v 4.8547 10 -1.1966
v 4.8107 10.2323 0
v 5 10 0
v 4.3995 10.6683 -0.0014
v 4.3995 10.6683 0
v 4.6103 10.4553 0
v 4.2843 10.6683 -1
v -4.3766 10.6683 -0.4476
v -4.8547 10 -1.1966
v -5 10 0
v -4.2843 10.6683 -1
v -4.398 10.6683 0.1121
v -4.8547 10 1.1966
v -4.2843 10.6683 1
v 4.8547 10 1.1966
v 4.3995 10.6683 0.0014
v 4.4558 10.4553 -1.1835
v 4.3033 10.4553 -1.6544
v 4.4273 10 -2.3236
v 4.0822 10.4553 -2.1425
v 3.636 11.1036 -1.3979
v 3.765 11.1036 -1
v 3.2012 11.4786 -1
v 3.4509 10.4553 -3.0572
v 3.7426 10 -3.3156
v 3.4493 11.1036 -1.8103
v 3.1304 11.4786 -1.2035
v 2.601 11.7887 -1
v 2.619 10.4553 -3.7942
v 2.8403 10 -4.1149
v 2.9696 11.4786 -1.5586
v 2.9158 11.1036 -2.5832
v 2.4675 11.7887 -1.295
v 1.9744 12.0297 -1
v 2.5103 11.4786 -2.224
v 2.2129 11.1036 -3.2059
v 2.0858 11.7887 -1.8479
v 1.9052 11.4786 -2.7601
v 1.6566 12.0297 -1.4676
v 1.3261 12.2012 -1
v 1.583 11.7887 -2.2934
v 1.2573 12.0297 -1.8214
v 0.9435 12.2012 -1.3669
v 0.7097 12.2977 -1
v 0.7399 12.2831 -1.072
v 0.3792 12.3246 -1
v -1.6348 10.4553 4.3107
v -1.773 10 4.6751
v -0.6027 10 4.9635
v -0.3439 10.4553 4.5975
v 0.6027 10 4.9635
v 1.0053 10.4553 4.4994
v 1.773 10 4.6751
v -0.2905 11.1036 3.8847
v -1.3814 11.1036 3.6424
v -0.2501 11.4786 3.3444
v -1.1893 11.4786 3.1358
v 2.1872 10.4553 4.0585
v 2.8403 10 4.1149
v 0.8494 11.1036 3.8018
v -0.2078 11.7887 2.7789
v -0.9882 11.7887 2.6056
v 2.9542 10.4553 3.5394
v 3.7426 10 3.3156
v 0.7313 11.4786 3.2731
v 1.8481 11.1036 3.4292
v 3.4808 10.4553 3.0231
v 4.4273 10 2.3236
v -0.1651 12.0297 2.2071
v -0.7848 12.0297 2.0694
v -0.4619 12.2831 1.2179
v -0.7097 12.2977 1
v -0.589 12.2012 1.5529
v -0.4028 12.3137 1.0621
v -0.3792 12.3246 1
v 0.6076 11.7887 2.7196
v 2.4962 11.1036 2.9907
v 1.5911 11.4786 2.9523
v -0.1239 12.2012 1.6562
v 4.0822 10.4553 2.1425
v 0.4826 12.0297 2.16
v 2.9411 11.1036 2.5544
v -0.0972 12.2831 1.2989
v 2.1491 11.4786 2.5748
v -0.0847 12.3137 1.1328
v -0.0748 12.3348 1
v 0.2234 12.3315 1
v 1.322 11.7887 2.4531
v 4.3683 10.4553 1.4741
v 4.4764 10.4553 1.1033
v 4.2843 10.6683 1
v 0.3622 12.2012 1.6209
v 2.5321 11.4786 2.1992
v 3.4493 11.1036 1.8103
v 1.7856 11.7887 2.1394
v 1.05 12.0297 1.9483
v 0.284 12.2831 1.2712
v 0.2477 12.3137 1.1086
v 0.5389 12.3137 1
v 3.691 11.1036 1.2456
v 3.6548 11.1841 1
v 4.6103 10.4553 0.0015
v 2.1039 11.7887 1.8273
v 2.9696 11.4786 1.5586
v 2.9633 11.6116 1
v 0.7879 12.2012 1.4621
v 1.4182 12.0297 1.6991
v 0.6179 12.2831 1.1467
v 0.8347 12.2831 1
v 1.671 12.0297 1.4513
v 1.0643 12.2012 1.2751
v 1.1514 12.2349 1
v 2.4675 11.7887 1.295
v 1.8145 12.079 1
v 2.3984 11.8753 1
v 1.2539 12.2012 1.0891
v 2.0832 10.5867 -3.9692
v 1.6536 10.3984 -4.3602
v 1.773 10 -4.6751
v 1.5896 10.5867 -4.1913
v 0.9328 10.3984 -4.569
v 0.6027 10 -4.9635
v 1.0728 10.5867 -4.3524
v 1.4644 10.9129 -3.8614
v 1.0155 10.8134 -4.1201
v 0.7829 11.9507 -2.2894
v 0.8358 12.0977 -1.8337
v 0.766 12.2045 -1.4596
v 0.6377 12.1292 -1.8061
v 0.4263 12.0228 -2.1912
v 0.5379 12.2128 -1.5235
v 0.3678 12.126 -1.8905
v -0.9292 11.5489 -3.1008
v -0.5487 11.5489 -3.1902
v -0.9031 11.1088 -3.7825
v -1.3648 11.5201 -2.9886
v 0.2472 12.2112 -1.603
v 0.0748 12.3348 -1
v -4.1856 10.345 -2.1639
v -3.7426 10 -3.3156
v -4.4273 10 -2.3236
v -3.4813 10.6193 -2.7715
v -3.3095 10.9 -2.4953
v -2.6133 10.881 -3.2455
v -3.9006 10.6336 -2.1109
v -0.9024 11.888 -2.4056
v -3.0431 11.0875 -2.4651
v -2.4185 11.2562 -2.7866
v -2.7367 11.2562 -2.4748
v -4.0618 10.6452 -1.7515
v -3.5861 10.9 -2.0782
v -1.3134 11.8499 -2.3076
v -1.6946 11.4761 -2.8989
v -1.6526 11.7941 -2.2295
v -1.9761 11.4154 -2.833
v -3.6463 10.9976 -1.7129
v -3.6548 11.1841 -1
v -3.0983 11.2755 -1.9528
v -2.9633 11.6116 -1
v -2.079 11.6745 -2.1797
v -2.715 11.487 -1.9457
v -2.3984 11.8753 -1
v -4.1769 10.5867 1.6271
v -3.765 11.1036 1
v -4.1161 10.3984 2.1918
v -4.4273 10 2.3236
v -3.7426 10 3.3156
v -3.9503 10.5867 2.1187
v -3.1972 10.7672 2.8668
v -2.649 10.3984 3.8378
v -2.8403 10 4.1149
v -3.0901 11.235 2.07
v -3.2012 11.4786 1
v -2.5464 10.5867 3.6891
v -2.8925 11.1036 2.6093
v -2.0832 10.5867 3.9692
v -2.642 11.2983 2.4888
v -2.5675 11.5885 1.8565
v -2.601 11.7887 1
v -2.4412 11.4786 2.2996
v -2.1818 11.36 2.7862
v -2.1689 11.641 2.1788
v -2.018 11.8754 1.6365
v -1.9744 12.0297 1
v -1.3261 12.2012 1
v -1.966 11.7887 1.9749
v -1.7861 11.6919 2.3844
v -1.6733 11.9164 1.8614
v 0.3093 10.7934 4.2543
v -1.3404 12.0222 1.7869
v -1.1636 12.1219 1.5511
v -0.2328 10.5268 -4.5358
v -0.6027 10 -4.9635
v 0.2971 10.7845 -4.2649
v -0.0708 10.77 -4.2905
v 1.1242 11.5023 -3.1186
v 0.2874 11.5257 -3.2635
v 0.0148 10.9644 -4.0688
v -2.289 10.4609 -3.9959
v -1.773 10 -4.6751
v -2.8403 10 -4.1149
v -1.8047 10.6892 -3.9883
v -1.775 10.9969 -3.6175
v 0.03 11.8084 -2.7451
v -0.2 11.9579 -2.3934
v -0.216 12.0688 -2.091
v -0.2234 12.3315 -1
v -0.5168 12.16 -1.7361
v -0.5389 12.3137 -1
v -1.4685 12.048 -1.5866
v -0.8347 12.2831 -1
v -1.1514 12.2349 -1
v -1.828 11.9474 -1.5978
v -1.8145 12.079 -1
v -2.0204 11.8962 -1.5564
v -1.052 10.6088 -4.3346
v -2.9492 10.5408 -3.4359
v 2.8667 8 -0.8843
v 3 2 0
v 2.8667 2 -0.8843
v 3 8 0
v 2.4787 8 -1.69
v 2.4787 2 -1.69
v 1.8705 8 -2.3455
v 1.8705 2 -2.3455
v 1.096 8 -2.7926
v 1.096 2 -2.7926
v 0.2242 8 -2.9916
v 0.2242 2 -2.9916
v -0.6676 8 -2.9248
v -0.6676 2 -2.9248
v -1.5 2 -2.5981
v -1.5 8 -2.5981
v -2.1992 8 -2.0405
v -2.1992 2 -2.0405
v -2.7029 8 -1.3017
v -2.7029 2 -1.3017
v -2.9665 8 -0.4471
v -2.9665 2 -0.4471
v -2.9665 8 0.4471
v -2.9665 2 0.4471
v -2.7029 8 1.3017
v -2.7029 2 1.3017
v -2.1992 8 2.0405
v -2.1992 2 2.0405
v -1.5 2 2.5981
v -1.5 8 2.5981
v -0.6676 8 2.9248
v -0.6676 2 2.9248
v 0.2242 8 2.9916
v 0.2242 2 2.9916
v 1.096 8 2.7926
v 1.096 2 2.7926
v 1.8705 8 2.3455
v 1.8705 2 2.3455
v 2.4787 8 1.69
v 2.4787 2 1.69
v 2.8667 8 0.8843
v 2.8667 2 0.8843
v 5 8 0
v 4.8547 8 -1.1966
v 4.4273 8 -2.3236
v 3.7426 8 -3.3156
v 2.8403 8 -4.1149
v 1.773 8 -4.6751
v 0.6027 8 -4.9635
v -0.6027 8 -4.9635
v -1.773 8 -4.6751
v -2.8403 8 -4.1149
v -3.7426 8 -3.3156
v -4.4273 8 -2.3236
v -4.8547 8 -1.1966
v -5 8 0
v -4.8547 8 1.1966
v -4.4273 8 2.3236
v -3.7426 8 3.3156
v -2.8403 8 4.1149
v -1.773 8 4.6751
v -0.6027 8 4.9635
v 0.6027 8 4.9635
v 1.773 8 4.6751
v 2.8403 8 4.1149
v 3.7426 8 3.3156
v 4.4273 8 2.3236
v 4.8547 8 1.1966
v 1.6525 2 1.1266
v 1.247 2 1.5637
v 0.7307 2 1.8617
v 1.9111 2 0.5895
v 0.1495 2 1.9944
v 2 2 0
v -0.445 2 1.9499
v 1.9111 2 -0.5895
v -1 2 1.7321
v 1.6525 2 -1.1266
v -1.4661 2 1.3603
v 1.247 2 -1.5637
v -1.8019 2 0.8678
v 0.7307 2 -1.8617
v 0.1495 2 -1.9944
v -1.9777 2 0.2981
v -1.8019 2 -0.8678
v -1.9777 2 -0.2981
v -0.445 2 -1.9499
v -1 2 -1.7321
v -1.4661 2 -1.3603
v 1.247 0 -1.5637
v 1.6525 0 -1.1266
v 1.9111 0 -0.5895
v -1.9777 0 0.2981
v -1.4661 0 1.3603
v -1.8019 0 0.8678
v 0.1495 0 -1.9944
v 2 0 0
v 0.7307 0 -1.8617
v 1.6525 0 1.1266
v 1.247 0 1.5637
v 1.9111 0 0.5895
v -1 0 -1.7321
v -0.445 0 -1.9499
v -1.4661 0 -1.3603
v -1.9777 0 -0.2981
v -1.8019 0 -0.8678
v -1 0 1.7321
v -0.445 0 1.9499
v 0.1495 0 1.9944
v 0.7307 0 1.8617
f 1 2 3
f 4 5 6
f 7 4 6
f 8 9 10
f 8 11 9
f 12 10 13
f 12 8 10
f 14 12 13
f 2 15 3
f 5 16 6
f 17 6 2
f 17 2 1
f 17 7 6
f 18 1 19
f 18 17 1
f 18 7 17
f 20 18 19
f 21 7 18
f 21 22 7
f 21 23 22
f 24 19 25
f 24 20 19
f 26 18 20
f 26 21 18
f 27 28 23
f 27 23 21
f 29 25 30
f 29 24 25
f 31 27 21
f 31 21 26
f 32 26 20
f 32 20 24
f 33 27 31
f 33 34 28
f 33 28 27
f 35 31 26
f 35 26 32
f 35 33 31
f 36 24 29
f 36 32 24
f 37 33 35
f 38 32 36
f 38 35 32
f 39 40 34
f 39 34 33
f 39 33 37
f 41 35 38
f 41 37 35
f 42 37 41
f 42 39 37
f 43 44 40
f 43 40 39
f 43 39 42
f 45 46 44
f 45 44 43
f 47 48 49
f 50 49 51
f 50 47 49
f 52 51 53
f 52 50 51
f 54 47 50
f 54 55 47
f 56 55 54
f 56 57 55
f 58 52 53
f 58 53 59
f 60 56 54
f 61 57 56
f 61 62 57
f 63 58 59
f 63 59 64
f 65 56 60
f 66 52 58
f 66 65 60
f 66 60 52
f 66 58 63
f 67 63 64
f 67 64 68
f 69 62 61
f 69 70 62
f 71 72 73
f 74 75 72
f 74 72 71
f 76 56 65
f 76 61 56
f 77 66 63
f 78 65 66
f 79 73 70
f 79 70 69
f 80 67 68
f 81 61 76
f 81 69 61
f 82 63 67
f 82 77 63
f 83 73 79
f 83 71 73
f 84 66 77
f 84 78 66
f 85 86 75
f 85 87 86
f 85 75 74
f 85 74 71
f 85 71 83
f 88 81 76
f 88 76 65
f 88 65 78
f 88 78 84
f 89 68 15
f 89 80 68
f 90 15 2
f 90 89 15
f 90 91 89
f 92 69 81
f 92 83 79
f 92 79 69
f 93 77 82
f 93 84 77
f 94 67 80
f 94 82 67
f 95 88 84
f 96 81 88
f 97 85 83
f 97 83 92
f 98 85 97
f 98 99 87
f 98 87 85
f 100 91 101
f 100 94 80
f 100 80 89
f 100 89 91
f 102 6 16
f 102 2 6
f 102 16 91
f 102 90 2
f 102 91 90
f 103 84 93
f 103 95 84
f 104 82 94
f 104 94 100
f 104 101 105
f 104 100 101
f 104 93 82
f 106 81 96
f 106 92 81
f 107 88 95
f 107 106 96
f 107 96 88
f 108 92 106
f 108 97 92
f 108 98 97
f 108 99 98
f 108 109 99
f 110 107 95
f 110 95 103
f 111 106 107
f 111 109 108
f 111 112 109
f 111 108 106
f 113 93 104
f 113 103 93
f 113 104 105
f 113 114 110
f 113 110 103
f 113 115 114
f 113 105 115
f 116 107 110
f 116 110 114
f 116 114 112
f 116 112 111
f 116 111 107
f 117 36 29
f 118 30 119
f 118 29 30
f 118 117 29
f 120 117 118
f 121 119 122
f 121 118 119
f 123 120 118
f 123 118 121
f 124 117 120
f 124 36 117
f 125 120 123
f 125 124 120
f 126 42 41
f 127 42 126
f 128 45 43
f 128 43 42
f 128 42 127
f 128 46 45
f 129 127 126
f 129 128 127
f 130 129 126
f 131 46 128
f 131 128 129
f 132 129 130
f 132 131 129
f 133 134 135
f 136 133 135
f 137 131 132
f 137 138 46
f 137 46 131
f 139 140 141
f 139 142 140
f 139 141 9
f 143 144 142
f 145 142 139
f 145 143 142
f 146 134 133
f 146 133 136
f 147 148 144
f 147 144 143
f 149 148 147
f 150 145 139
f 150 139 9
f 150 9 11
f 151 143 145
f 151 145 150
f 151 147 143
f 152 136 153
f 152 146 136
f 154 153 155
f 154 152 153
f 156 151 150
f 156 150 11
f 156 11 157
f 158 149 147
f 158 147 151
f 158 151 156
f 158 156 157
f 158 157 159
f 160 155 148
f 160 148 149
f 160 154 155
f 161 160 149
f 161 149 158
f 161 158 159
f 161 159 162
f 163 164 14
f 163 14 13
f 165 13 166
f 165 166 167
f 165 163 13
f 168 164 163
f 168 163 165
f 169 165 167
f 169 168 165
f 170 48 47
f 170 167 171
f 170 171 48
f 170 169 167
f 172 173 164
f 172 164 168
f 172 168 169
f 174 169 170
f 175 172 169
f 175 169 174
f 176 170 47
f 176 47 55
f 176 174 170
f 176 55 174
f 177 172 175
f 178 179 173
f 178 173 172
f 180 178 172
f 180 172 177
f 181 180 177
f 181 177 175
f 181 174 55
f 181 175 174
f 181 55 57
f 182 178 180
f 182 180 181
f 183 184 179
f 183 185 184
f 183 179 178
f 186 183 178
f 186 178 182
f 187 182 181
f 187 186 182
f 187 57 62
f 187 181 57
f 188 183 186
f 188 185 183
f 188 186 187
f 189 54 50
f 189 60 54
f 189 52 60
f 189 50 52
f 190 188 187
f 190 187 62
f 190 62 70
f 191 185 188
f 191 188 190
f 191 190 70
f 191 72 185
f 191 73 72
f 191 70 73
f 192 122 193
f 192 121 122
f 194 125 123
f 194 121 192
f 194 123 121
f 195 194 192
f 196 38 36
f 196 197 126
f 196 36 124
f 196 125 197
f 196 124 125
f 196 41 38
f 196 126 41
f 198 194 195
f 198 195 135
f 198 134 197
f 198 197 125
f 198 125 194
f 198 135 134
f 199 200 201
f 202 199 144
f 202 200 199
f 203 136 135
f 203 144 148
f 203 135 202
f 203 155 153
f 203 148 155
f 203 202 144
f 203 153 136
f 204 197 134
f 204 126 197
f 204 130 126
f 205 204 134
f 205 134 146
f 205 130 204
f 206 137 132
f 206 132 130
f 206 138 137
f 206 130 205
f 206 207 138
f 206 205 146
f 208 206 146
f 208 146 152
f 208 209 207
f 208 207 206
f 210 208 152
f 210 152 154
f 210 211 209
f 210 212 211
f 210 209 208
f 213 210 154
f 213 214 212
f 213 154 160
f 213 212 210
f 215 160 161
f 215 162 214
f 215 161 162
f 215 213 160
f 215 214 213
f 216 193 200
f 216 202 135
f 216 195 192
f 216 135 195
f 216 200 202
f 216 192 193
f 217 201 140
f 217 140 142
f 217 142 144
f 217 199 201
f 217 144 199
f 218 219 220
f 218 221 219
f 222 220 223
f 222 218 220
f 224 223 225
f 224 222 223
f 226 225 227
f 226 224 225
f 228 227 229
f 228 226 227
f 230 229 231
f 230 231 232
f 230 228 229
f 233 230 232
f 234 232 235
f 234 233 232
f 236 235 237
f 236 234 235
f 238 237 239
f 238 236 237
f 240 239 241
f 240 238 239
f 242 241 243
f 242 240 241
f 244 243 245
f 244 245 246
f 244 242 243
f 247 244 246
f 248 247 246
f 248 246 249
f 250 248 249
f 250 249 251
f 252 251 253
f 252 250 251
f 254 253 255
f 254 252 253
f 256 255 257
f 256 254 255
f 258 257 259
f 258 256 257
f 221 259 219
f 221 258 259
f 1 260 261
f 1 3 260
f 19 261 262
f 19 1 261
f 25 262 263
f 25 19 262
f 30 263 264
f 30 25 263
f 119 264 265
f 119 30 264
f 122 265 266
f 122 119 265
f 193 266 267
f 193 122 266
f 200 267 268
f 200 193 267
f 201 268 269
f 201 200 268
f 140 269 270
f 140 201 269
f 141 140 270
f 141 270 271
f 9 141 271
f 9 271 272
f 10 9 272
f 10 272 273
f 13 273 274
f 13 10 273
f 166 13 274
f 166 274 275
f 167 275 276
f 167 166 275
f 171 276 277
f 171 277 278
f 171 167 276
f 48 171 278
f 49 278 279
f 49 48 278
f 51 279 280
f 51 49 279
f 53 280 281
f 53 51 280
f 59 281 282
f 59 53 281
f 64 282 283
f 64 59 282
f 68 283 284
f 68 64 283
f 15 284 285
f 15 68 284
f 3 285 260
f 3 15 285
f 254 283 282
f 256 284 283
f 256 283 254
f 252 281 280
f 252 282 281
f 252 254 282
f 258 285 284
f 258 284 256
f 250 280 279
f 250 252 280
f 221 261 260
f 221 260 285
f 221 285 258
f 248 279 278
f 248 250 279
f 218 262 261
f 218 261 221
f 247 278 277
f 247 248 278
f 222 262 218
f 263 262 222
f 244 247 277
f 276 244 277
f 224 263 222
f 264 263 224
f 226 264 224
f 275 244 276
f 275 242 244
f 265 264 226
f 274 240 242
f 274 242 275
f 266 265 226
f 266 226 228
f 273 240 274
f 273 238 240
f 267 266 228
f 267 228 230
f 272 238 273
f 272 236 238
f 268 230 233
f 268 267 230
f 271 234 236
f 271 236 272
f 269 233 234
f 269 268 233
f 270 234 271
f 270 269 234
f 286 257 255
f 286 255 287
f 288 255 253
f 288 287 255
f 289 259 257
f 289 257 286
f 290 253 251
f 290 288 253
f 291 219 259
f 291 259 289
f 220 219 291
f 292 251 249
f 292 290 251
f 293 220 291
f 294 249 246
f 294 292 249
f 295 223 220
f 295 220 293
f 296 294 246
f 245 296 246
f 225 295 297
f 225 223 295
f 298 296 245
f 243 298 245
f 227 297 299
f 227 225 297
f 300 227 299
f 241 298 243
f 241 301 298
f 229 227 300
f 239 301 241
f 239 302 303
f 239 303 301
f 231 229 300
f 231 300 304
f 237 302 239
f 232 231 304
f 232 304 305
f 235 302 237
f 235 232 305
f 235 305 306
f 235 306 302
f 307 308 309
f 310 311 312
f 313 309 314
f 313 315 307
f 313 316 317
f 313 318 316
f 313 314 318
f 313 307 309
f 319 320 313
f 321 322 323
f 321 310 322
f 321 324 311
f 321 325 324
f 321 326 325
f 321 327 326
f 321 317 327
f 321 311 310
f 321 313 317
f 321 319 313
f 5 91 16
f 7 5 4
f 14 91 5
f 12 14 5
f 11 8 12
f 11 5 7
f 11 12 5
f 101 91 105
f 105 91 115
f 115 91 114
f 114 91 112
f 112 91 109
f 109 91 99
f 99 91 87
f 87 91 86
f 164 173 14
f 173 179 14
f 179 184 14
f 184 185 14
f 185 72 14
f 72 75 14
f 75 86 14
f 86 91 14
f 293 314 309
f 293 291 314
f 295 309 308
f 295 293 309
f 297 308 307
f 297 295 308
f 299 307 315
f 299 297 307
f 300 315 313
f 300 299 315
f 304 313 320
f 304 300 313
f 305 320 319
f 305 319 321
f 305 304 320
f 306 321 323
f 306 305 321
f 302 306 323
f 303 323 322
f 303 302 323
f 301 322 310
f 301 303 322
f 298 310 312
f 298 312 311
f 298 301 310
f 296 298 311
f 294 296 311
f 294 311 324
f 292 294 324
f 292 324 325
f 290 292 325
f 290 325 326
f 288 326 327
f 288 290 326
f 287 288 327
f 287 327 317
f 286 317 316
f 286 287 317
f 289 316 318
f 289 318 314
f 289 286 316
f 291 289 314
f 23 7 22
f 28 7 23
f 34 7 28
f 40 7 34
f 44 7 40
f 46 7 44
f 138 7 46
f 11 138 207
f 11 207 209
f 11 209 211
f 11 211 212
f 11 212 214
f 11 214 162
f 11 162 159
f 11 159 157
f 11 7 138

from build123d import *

# Parameters (mm, degrees)
KES_EKSTR_ZYON12_START = -4.399452
IZIM9_W                = 2
IZIM9_H                = 1.732554961
KES_EKSTR_ZYON12_DEPTH = 8.798904


with BuildPart() as part:
    # Çizim2 → Döndür3 (revolve)
    with BuildSketch(Plane.XY):
        with BuildLine():
            Line((0, 0), (2, 0))
            Line((2, 0), (2, 2))
            Line((2, 2), (3, 2))
            Line((3, 2), (3, 8))
            Line((3, 8), (5, 8))
            Line((5, 8), (5, 10))
            ThreePointArc((5, 10), (2.783322768, 11.790255766), (0, 12.4))
            Line((0, 12.4), (0, 0))
        make_face()
    revolve(axis=Axis((0, 0, 0), (0, 1, 0)))

    # Çizim9 → Kes-Ekstrüzyon12 (cut)
    with BuildSketch(Plane(origin=(0, 0, 0), x_dir=(0, 0, -1), z_dir=(1, 0, 0)).offset(KES_EKSTR_ZYON12_START)):
        with Locations((0, 11.53453533)):
            Rectangle(IZIM9_W, IZIM9_H)
    kes_ekstr_zyon12 = extrude(amount=KES_EKSTR_ZYON12_DEPTH, mode=Mode.SUBTRACT)

    # Aynalama2: Kes-Ekstrüzyon12 across plane
    add(kes_ekstr_zyon12.mirror(Plane(origin=(0, 0, 0), x_dir=(0, 0, 1), z_dir=(1, 0, 0))), mode=Mode.SUBTRACT)


solid = part.part
